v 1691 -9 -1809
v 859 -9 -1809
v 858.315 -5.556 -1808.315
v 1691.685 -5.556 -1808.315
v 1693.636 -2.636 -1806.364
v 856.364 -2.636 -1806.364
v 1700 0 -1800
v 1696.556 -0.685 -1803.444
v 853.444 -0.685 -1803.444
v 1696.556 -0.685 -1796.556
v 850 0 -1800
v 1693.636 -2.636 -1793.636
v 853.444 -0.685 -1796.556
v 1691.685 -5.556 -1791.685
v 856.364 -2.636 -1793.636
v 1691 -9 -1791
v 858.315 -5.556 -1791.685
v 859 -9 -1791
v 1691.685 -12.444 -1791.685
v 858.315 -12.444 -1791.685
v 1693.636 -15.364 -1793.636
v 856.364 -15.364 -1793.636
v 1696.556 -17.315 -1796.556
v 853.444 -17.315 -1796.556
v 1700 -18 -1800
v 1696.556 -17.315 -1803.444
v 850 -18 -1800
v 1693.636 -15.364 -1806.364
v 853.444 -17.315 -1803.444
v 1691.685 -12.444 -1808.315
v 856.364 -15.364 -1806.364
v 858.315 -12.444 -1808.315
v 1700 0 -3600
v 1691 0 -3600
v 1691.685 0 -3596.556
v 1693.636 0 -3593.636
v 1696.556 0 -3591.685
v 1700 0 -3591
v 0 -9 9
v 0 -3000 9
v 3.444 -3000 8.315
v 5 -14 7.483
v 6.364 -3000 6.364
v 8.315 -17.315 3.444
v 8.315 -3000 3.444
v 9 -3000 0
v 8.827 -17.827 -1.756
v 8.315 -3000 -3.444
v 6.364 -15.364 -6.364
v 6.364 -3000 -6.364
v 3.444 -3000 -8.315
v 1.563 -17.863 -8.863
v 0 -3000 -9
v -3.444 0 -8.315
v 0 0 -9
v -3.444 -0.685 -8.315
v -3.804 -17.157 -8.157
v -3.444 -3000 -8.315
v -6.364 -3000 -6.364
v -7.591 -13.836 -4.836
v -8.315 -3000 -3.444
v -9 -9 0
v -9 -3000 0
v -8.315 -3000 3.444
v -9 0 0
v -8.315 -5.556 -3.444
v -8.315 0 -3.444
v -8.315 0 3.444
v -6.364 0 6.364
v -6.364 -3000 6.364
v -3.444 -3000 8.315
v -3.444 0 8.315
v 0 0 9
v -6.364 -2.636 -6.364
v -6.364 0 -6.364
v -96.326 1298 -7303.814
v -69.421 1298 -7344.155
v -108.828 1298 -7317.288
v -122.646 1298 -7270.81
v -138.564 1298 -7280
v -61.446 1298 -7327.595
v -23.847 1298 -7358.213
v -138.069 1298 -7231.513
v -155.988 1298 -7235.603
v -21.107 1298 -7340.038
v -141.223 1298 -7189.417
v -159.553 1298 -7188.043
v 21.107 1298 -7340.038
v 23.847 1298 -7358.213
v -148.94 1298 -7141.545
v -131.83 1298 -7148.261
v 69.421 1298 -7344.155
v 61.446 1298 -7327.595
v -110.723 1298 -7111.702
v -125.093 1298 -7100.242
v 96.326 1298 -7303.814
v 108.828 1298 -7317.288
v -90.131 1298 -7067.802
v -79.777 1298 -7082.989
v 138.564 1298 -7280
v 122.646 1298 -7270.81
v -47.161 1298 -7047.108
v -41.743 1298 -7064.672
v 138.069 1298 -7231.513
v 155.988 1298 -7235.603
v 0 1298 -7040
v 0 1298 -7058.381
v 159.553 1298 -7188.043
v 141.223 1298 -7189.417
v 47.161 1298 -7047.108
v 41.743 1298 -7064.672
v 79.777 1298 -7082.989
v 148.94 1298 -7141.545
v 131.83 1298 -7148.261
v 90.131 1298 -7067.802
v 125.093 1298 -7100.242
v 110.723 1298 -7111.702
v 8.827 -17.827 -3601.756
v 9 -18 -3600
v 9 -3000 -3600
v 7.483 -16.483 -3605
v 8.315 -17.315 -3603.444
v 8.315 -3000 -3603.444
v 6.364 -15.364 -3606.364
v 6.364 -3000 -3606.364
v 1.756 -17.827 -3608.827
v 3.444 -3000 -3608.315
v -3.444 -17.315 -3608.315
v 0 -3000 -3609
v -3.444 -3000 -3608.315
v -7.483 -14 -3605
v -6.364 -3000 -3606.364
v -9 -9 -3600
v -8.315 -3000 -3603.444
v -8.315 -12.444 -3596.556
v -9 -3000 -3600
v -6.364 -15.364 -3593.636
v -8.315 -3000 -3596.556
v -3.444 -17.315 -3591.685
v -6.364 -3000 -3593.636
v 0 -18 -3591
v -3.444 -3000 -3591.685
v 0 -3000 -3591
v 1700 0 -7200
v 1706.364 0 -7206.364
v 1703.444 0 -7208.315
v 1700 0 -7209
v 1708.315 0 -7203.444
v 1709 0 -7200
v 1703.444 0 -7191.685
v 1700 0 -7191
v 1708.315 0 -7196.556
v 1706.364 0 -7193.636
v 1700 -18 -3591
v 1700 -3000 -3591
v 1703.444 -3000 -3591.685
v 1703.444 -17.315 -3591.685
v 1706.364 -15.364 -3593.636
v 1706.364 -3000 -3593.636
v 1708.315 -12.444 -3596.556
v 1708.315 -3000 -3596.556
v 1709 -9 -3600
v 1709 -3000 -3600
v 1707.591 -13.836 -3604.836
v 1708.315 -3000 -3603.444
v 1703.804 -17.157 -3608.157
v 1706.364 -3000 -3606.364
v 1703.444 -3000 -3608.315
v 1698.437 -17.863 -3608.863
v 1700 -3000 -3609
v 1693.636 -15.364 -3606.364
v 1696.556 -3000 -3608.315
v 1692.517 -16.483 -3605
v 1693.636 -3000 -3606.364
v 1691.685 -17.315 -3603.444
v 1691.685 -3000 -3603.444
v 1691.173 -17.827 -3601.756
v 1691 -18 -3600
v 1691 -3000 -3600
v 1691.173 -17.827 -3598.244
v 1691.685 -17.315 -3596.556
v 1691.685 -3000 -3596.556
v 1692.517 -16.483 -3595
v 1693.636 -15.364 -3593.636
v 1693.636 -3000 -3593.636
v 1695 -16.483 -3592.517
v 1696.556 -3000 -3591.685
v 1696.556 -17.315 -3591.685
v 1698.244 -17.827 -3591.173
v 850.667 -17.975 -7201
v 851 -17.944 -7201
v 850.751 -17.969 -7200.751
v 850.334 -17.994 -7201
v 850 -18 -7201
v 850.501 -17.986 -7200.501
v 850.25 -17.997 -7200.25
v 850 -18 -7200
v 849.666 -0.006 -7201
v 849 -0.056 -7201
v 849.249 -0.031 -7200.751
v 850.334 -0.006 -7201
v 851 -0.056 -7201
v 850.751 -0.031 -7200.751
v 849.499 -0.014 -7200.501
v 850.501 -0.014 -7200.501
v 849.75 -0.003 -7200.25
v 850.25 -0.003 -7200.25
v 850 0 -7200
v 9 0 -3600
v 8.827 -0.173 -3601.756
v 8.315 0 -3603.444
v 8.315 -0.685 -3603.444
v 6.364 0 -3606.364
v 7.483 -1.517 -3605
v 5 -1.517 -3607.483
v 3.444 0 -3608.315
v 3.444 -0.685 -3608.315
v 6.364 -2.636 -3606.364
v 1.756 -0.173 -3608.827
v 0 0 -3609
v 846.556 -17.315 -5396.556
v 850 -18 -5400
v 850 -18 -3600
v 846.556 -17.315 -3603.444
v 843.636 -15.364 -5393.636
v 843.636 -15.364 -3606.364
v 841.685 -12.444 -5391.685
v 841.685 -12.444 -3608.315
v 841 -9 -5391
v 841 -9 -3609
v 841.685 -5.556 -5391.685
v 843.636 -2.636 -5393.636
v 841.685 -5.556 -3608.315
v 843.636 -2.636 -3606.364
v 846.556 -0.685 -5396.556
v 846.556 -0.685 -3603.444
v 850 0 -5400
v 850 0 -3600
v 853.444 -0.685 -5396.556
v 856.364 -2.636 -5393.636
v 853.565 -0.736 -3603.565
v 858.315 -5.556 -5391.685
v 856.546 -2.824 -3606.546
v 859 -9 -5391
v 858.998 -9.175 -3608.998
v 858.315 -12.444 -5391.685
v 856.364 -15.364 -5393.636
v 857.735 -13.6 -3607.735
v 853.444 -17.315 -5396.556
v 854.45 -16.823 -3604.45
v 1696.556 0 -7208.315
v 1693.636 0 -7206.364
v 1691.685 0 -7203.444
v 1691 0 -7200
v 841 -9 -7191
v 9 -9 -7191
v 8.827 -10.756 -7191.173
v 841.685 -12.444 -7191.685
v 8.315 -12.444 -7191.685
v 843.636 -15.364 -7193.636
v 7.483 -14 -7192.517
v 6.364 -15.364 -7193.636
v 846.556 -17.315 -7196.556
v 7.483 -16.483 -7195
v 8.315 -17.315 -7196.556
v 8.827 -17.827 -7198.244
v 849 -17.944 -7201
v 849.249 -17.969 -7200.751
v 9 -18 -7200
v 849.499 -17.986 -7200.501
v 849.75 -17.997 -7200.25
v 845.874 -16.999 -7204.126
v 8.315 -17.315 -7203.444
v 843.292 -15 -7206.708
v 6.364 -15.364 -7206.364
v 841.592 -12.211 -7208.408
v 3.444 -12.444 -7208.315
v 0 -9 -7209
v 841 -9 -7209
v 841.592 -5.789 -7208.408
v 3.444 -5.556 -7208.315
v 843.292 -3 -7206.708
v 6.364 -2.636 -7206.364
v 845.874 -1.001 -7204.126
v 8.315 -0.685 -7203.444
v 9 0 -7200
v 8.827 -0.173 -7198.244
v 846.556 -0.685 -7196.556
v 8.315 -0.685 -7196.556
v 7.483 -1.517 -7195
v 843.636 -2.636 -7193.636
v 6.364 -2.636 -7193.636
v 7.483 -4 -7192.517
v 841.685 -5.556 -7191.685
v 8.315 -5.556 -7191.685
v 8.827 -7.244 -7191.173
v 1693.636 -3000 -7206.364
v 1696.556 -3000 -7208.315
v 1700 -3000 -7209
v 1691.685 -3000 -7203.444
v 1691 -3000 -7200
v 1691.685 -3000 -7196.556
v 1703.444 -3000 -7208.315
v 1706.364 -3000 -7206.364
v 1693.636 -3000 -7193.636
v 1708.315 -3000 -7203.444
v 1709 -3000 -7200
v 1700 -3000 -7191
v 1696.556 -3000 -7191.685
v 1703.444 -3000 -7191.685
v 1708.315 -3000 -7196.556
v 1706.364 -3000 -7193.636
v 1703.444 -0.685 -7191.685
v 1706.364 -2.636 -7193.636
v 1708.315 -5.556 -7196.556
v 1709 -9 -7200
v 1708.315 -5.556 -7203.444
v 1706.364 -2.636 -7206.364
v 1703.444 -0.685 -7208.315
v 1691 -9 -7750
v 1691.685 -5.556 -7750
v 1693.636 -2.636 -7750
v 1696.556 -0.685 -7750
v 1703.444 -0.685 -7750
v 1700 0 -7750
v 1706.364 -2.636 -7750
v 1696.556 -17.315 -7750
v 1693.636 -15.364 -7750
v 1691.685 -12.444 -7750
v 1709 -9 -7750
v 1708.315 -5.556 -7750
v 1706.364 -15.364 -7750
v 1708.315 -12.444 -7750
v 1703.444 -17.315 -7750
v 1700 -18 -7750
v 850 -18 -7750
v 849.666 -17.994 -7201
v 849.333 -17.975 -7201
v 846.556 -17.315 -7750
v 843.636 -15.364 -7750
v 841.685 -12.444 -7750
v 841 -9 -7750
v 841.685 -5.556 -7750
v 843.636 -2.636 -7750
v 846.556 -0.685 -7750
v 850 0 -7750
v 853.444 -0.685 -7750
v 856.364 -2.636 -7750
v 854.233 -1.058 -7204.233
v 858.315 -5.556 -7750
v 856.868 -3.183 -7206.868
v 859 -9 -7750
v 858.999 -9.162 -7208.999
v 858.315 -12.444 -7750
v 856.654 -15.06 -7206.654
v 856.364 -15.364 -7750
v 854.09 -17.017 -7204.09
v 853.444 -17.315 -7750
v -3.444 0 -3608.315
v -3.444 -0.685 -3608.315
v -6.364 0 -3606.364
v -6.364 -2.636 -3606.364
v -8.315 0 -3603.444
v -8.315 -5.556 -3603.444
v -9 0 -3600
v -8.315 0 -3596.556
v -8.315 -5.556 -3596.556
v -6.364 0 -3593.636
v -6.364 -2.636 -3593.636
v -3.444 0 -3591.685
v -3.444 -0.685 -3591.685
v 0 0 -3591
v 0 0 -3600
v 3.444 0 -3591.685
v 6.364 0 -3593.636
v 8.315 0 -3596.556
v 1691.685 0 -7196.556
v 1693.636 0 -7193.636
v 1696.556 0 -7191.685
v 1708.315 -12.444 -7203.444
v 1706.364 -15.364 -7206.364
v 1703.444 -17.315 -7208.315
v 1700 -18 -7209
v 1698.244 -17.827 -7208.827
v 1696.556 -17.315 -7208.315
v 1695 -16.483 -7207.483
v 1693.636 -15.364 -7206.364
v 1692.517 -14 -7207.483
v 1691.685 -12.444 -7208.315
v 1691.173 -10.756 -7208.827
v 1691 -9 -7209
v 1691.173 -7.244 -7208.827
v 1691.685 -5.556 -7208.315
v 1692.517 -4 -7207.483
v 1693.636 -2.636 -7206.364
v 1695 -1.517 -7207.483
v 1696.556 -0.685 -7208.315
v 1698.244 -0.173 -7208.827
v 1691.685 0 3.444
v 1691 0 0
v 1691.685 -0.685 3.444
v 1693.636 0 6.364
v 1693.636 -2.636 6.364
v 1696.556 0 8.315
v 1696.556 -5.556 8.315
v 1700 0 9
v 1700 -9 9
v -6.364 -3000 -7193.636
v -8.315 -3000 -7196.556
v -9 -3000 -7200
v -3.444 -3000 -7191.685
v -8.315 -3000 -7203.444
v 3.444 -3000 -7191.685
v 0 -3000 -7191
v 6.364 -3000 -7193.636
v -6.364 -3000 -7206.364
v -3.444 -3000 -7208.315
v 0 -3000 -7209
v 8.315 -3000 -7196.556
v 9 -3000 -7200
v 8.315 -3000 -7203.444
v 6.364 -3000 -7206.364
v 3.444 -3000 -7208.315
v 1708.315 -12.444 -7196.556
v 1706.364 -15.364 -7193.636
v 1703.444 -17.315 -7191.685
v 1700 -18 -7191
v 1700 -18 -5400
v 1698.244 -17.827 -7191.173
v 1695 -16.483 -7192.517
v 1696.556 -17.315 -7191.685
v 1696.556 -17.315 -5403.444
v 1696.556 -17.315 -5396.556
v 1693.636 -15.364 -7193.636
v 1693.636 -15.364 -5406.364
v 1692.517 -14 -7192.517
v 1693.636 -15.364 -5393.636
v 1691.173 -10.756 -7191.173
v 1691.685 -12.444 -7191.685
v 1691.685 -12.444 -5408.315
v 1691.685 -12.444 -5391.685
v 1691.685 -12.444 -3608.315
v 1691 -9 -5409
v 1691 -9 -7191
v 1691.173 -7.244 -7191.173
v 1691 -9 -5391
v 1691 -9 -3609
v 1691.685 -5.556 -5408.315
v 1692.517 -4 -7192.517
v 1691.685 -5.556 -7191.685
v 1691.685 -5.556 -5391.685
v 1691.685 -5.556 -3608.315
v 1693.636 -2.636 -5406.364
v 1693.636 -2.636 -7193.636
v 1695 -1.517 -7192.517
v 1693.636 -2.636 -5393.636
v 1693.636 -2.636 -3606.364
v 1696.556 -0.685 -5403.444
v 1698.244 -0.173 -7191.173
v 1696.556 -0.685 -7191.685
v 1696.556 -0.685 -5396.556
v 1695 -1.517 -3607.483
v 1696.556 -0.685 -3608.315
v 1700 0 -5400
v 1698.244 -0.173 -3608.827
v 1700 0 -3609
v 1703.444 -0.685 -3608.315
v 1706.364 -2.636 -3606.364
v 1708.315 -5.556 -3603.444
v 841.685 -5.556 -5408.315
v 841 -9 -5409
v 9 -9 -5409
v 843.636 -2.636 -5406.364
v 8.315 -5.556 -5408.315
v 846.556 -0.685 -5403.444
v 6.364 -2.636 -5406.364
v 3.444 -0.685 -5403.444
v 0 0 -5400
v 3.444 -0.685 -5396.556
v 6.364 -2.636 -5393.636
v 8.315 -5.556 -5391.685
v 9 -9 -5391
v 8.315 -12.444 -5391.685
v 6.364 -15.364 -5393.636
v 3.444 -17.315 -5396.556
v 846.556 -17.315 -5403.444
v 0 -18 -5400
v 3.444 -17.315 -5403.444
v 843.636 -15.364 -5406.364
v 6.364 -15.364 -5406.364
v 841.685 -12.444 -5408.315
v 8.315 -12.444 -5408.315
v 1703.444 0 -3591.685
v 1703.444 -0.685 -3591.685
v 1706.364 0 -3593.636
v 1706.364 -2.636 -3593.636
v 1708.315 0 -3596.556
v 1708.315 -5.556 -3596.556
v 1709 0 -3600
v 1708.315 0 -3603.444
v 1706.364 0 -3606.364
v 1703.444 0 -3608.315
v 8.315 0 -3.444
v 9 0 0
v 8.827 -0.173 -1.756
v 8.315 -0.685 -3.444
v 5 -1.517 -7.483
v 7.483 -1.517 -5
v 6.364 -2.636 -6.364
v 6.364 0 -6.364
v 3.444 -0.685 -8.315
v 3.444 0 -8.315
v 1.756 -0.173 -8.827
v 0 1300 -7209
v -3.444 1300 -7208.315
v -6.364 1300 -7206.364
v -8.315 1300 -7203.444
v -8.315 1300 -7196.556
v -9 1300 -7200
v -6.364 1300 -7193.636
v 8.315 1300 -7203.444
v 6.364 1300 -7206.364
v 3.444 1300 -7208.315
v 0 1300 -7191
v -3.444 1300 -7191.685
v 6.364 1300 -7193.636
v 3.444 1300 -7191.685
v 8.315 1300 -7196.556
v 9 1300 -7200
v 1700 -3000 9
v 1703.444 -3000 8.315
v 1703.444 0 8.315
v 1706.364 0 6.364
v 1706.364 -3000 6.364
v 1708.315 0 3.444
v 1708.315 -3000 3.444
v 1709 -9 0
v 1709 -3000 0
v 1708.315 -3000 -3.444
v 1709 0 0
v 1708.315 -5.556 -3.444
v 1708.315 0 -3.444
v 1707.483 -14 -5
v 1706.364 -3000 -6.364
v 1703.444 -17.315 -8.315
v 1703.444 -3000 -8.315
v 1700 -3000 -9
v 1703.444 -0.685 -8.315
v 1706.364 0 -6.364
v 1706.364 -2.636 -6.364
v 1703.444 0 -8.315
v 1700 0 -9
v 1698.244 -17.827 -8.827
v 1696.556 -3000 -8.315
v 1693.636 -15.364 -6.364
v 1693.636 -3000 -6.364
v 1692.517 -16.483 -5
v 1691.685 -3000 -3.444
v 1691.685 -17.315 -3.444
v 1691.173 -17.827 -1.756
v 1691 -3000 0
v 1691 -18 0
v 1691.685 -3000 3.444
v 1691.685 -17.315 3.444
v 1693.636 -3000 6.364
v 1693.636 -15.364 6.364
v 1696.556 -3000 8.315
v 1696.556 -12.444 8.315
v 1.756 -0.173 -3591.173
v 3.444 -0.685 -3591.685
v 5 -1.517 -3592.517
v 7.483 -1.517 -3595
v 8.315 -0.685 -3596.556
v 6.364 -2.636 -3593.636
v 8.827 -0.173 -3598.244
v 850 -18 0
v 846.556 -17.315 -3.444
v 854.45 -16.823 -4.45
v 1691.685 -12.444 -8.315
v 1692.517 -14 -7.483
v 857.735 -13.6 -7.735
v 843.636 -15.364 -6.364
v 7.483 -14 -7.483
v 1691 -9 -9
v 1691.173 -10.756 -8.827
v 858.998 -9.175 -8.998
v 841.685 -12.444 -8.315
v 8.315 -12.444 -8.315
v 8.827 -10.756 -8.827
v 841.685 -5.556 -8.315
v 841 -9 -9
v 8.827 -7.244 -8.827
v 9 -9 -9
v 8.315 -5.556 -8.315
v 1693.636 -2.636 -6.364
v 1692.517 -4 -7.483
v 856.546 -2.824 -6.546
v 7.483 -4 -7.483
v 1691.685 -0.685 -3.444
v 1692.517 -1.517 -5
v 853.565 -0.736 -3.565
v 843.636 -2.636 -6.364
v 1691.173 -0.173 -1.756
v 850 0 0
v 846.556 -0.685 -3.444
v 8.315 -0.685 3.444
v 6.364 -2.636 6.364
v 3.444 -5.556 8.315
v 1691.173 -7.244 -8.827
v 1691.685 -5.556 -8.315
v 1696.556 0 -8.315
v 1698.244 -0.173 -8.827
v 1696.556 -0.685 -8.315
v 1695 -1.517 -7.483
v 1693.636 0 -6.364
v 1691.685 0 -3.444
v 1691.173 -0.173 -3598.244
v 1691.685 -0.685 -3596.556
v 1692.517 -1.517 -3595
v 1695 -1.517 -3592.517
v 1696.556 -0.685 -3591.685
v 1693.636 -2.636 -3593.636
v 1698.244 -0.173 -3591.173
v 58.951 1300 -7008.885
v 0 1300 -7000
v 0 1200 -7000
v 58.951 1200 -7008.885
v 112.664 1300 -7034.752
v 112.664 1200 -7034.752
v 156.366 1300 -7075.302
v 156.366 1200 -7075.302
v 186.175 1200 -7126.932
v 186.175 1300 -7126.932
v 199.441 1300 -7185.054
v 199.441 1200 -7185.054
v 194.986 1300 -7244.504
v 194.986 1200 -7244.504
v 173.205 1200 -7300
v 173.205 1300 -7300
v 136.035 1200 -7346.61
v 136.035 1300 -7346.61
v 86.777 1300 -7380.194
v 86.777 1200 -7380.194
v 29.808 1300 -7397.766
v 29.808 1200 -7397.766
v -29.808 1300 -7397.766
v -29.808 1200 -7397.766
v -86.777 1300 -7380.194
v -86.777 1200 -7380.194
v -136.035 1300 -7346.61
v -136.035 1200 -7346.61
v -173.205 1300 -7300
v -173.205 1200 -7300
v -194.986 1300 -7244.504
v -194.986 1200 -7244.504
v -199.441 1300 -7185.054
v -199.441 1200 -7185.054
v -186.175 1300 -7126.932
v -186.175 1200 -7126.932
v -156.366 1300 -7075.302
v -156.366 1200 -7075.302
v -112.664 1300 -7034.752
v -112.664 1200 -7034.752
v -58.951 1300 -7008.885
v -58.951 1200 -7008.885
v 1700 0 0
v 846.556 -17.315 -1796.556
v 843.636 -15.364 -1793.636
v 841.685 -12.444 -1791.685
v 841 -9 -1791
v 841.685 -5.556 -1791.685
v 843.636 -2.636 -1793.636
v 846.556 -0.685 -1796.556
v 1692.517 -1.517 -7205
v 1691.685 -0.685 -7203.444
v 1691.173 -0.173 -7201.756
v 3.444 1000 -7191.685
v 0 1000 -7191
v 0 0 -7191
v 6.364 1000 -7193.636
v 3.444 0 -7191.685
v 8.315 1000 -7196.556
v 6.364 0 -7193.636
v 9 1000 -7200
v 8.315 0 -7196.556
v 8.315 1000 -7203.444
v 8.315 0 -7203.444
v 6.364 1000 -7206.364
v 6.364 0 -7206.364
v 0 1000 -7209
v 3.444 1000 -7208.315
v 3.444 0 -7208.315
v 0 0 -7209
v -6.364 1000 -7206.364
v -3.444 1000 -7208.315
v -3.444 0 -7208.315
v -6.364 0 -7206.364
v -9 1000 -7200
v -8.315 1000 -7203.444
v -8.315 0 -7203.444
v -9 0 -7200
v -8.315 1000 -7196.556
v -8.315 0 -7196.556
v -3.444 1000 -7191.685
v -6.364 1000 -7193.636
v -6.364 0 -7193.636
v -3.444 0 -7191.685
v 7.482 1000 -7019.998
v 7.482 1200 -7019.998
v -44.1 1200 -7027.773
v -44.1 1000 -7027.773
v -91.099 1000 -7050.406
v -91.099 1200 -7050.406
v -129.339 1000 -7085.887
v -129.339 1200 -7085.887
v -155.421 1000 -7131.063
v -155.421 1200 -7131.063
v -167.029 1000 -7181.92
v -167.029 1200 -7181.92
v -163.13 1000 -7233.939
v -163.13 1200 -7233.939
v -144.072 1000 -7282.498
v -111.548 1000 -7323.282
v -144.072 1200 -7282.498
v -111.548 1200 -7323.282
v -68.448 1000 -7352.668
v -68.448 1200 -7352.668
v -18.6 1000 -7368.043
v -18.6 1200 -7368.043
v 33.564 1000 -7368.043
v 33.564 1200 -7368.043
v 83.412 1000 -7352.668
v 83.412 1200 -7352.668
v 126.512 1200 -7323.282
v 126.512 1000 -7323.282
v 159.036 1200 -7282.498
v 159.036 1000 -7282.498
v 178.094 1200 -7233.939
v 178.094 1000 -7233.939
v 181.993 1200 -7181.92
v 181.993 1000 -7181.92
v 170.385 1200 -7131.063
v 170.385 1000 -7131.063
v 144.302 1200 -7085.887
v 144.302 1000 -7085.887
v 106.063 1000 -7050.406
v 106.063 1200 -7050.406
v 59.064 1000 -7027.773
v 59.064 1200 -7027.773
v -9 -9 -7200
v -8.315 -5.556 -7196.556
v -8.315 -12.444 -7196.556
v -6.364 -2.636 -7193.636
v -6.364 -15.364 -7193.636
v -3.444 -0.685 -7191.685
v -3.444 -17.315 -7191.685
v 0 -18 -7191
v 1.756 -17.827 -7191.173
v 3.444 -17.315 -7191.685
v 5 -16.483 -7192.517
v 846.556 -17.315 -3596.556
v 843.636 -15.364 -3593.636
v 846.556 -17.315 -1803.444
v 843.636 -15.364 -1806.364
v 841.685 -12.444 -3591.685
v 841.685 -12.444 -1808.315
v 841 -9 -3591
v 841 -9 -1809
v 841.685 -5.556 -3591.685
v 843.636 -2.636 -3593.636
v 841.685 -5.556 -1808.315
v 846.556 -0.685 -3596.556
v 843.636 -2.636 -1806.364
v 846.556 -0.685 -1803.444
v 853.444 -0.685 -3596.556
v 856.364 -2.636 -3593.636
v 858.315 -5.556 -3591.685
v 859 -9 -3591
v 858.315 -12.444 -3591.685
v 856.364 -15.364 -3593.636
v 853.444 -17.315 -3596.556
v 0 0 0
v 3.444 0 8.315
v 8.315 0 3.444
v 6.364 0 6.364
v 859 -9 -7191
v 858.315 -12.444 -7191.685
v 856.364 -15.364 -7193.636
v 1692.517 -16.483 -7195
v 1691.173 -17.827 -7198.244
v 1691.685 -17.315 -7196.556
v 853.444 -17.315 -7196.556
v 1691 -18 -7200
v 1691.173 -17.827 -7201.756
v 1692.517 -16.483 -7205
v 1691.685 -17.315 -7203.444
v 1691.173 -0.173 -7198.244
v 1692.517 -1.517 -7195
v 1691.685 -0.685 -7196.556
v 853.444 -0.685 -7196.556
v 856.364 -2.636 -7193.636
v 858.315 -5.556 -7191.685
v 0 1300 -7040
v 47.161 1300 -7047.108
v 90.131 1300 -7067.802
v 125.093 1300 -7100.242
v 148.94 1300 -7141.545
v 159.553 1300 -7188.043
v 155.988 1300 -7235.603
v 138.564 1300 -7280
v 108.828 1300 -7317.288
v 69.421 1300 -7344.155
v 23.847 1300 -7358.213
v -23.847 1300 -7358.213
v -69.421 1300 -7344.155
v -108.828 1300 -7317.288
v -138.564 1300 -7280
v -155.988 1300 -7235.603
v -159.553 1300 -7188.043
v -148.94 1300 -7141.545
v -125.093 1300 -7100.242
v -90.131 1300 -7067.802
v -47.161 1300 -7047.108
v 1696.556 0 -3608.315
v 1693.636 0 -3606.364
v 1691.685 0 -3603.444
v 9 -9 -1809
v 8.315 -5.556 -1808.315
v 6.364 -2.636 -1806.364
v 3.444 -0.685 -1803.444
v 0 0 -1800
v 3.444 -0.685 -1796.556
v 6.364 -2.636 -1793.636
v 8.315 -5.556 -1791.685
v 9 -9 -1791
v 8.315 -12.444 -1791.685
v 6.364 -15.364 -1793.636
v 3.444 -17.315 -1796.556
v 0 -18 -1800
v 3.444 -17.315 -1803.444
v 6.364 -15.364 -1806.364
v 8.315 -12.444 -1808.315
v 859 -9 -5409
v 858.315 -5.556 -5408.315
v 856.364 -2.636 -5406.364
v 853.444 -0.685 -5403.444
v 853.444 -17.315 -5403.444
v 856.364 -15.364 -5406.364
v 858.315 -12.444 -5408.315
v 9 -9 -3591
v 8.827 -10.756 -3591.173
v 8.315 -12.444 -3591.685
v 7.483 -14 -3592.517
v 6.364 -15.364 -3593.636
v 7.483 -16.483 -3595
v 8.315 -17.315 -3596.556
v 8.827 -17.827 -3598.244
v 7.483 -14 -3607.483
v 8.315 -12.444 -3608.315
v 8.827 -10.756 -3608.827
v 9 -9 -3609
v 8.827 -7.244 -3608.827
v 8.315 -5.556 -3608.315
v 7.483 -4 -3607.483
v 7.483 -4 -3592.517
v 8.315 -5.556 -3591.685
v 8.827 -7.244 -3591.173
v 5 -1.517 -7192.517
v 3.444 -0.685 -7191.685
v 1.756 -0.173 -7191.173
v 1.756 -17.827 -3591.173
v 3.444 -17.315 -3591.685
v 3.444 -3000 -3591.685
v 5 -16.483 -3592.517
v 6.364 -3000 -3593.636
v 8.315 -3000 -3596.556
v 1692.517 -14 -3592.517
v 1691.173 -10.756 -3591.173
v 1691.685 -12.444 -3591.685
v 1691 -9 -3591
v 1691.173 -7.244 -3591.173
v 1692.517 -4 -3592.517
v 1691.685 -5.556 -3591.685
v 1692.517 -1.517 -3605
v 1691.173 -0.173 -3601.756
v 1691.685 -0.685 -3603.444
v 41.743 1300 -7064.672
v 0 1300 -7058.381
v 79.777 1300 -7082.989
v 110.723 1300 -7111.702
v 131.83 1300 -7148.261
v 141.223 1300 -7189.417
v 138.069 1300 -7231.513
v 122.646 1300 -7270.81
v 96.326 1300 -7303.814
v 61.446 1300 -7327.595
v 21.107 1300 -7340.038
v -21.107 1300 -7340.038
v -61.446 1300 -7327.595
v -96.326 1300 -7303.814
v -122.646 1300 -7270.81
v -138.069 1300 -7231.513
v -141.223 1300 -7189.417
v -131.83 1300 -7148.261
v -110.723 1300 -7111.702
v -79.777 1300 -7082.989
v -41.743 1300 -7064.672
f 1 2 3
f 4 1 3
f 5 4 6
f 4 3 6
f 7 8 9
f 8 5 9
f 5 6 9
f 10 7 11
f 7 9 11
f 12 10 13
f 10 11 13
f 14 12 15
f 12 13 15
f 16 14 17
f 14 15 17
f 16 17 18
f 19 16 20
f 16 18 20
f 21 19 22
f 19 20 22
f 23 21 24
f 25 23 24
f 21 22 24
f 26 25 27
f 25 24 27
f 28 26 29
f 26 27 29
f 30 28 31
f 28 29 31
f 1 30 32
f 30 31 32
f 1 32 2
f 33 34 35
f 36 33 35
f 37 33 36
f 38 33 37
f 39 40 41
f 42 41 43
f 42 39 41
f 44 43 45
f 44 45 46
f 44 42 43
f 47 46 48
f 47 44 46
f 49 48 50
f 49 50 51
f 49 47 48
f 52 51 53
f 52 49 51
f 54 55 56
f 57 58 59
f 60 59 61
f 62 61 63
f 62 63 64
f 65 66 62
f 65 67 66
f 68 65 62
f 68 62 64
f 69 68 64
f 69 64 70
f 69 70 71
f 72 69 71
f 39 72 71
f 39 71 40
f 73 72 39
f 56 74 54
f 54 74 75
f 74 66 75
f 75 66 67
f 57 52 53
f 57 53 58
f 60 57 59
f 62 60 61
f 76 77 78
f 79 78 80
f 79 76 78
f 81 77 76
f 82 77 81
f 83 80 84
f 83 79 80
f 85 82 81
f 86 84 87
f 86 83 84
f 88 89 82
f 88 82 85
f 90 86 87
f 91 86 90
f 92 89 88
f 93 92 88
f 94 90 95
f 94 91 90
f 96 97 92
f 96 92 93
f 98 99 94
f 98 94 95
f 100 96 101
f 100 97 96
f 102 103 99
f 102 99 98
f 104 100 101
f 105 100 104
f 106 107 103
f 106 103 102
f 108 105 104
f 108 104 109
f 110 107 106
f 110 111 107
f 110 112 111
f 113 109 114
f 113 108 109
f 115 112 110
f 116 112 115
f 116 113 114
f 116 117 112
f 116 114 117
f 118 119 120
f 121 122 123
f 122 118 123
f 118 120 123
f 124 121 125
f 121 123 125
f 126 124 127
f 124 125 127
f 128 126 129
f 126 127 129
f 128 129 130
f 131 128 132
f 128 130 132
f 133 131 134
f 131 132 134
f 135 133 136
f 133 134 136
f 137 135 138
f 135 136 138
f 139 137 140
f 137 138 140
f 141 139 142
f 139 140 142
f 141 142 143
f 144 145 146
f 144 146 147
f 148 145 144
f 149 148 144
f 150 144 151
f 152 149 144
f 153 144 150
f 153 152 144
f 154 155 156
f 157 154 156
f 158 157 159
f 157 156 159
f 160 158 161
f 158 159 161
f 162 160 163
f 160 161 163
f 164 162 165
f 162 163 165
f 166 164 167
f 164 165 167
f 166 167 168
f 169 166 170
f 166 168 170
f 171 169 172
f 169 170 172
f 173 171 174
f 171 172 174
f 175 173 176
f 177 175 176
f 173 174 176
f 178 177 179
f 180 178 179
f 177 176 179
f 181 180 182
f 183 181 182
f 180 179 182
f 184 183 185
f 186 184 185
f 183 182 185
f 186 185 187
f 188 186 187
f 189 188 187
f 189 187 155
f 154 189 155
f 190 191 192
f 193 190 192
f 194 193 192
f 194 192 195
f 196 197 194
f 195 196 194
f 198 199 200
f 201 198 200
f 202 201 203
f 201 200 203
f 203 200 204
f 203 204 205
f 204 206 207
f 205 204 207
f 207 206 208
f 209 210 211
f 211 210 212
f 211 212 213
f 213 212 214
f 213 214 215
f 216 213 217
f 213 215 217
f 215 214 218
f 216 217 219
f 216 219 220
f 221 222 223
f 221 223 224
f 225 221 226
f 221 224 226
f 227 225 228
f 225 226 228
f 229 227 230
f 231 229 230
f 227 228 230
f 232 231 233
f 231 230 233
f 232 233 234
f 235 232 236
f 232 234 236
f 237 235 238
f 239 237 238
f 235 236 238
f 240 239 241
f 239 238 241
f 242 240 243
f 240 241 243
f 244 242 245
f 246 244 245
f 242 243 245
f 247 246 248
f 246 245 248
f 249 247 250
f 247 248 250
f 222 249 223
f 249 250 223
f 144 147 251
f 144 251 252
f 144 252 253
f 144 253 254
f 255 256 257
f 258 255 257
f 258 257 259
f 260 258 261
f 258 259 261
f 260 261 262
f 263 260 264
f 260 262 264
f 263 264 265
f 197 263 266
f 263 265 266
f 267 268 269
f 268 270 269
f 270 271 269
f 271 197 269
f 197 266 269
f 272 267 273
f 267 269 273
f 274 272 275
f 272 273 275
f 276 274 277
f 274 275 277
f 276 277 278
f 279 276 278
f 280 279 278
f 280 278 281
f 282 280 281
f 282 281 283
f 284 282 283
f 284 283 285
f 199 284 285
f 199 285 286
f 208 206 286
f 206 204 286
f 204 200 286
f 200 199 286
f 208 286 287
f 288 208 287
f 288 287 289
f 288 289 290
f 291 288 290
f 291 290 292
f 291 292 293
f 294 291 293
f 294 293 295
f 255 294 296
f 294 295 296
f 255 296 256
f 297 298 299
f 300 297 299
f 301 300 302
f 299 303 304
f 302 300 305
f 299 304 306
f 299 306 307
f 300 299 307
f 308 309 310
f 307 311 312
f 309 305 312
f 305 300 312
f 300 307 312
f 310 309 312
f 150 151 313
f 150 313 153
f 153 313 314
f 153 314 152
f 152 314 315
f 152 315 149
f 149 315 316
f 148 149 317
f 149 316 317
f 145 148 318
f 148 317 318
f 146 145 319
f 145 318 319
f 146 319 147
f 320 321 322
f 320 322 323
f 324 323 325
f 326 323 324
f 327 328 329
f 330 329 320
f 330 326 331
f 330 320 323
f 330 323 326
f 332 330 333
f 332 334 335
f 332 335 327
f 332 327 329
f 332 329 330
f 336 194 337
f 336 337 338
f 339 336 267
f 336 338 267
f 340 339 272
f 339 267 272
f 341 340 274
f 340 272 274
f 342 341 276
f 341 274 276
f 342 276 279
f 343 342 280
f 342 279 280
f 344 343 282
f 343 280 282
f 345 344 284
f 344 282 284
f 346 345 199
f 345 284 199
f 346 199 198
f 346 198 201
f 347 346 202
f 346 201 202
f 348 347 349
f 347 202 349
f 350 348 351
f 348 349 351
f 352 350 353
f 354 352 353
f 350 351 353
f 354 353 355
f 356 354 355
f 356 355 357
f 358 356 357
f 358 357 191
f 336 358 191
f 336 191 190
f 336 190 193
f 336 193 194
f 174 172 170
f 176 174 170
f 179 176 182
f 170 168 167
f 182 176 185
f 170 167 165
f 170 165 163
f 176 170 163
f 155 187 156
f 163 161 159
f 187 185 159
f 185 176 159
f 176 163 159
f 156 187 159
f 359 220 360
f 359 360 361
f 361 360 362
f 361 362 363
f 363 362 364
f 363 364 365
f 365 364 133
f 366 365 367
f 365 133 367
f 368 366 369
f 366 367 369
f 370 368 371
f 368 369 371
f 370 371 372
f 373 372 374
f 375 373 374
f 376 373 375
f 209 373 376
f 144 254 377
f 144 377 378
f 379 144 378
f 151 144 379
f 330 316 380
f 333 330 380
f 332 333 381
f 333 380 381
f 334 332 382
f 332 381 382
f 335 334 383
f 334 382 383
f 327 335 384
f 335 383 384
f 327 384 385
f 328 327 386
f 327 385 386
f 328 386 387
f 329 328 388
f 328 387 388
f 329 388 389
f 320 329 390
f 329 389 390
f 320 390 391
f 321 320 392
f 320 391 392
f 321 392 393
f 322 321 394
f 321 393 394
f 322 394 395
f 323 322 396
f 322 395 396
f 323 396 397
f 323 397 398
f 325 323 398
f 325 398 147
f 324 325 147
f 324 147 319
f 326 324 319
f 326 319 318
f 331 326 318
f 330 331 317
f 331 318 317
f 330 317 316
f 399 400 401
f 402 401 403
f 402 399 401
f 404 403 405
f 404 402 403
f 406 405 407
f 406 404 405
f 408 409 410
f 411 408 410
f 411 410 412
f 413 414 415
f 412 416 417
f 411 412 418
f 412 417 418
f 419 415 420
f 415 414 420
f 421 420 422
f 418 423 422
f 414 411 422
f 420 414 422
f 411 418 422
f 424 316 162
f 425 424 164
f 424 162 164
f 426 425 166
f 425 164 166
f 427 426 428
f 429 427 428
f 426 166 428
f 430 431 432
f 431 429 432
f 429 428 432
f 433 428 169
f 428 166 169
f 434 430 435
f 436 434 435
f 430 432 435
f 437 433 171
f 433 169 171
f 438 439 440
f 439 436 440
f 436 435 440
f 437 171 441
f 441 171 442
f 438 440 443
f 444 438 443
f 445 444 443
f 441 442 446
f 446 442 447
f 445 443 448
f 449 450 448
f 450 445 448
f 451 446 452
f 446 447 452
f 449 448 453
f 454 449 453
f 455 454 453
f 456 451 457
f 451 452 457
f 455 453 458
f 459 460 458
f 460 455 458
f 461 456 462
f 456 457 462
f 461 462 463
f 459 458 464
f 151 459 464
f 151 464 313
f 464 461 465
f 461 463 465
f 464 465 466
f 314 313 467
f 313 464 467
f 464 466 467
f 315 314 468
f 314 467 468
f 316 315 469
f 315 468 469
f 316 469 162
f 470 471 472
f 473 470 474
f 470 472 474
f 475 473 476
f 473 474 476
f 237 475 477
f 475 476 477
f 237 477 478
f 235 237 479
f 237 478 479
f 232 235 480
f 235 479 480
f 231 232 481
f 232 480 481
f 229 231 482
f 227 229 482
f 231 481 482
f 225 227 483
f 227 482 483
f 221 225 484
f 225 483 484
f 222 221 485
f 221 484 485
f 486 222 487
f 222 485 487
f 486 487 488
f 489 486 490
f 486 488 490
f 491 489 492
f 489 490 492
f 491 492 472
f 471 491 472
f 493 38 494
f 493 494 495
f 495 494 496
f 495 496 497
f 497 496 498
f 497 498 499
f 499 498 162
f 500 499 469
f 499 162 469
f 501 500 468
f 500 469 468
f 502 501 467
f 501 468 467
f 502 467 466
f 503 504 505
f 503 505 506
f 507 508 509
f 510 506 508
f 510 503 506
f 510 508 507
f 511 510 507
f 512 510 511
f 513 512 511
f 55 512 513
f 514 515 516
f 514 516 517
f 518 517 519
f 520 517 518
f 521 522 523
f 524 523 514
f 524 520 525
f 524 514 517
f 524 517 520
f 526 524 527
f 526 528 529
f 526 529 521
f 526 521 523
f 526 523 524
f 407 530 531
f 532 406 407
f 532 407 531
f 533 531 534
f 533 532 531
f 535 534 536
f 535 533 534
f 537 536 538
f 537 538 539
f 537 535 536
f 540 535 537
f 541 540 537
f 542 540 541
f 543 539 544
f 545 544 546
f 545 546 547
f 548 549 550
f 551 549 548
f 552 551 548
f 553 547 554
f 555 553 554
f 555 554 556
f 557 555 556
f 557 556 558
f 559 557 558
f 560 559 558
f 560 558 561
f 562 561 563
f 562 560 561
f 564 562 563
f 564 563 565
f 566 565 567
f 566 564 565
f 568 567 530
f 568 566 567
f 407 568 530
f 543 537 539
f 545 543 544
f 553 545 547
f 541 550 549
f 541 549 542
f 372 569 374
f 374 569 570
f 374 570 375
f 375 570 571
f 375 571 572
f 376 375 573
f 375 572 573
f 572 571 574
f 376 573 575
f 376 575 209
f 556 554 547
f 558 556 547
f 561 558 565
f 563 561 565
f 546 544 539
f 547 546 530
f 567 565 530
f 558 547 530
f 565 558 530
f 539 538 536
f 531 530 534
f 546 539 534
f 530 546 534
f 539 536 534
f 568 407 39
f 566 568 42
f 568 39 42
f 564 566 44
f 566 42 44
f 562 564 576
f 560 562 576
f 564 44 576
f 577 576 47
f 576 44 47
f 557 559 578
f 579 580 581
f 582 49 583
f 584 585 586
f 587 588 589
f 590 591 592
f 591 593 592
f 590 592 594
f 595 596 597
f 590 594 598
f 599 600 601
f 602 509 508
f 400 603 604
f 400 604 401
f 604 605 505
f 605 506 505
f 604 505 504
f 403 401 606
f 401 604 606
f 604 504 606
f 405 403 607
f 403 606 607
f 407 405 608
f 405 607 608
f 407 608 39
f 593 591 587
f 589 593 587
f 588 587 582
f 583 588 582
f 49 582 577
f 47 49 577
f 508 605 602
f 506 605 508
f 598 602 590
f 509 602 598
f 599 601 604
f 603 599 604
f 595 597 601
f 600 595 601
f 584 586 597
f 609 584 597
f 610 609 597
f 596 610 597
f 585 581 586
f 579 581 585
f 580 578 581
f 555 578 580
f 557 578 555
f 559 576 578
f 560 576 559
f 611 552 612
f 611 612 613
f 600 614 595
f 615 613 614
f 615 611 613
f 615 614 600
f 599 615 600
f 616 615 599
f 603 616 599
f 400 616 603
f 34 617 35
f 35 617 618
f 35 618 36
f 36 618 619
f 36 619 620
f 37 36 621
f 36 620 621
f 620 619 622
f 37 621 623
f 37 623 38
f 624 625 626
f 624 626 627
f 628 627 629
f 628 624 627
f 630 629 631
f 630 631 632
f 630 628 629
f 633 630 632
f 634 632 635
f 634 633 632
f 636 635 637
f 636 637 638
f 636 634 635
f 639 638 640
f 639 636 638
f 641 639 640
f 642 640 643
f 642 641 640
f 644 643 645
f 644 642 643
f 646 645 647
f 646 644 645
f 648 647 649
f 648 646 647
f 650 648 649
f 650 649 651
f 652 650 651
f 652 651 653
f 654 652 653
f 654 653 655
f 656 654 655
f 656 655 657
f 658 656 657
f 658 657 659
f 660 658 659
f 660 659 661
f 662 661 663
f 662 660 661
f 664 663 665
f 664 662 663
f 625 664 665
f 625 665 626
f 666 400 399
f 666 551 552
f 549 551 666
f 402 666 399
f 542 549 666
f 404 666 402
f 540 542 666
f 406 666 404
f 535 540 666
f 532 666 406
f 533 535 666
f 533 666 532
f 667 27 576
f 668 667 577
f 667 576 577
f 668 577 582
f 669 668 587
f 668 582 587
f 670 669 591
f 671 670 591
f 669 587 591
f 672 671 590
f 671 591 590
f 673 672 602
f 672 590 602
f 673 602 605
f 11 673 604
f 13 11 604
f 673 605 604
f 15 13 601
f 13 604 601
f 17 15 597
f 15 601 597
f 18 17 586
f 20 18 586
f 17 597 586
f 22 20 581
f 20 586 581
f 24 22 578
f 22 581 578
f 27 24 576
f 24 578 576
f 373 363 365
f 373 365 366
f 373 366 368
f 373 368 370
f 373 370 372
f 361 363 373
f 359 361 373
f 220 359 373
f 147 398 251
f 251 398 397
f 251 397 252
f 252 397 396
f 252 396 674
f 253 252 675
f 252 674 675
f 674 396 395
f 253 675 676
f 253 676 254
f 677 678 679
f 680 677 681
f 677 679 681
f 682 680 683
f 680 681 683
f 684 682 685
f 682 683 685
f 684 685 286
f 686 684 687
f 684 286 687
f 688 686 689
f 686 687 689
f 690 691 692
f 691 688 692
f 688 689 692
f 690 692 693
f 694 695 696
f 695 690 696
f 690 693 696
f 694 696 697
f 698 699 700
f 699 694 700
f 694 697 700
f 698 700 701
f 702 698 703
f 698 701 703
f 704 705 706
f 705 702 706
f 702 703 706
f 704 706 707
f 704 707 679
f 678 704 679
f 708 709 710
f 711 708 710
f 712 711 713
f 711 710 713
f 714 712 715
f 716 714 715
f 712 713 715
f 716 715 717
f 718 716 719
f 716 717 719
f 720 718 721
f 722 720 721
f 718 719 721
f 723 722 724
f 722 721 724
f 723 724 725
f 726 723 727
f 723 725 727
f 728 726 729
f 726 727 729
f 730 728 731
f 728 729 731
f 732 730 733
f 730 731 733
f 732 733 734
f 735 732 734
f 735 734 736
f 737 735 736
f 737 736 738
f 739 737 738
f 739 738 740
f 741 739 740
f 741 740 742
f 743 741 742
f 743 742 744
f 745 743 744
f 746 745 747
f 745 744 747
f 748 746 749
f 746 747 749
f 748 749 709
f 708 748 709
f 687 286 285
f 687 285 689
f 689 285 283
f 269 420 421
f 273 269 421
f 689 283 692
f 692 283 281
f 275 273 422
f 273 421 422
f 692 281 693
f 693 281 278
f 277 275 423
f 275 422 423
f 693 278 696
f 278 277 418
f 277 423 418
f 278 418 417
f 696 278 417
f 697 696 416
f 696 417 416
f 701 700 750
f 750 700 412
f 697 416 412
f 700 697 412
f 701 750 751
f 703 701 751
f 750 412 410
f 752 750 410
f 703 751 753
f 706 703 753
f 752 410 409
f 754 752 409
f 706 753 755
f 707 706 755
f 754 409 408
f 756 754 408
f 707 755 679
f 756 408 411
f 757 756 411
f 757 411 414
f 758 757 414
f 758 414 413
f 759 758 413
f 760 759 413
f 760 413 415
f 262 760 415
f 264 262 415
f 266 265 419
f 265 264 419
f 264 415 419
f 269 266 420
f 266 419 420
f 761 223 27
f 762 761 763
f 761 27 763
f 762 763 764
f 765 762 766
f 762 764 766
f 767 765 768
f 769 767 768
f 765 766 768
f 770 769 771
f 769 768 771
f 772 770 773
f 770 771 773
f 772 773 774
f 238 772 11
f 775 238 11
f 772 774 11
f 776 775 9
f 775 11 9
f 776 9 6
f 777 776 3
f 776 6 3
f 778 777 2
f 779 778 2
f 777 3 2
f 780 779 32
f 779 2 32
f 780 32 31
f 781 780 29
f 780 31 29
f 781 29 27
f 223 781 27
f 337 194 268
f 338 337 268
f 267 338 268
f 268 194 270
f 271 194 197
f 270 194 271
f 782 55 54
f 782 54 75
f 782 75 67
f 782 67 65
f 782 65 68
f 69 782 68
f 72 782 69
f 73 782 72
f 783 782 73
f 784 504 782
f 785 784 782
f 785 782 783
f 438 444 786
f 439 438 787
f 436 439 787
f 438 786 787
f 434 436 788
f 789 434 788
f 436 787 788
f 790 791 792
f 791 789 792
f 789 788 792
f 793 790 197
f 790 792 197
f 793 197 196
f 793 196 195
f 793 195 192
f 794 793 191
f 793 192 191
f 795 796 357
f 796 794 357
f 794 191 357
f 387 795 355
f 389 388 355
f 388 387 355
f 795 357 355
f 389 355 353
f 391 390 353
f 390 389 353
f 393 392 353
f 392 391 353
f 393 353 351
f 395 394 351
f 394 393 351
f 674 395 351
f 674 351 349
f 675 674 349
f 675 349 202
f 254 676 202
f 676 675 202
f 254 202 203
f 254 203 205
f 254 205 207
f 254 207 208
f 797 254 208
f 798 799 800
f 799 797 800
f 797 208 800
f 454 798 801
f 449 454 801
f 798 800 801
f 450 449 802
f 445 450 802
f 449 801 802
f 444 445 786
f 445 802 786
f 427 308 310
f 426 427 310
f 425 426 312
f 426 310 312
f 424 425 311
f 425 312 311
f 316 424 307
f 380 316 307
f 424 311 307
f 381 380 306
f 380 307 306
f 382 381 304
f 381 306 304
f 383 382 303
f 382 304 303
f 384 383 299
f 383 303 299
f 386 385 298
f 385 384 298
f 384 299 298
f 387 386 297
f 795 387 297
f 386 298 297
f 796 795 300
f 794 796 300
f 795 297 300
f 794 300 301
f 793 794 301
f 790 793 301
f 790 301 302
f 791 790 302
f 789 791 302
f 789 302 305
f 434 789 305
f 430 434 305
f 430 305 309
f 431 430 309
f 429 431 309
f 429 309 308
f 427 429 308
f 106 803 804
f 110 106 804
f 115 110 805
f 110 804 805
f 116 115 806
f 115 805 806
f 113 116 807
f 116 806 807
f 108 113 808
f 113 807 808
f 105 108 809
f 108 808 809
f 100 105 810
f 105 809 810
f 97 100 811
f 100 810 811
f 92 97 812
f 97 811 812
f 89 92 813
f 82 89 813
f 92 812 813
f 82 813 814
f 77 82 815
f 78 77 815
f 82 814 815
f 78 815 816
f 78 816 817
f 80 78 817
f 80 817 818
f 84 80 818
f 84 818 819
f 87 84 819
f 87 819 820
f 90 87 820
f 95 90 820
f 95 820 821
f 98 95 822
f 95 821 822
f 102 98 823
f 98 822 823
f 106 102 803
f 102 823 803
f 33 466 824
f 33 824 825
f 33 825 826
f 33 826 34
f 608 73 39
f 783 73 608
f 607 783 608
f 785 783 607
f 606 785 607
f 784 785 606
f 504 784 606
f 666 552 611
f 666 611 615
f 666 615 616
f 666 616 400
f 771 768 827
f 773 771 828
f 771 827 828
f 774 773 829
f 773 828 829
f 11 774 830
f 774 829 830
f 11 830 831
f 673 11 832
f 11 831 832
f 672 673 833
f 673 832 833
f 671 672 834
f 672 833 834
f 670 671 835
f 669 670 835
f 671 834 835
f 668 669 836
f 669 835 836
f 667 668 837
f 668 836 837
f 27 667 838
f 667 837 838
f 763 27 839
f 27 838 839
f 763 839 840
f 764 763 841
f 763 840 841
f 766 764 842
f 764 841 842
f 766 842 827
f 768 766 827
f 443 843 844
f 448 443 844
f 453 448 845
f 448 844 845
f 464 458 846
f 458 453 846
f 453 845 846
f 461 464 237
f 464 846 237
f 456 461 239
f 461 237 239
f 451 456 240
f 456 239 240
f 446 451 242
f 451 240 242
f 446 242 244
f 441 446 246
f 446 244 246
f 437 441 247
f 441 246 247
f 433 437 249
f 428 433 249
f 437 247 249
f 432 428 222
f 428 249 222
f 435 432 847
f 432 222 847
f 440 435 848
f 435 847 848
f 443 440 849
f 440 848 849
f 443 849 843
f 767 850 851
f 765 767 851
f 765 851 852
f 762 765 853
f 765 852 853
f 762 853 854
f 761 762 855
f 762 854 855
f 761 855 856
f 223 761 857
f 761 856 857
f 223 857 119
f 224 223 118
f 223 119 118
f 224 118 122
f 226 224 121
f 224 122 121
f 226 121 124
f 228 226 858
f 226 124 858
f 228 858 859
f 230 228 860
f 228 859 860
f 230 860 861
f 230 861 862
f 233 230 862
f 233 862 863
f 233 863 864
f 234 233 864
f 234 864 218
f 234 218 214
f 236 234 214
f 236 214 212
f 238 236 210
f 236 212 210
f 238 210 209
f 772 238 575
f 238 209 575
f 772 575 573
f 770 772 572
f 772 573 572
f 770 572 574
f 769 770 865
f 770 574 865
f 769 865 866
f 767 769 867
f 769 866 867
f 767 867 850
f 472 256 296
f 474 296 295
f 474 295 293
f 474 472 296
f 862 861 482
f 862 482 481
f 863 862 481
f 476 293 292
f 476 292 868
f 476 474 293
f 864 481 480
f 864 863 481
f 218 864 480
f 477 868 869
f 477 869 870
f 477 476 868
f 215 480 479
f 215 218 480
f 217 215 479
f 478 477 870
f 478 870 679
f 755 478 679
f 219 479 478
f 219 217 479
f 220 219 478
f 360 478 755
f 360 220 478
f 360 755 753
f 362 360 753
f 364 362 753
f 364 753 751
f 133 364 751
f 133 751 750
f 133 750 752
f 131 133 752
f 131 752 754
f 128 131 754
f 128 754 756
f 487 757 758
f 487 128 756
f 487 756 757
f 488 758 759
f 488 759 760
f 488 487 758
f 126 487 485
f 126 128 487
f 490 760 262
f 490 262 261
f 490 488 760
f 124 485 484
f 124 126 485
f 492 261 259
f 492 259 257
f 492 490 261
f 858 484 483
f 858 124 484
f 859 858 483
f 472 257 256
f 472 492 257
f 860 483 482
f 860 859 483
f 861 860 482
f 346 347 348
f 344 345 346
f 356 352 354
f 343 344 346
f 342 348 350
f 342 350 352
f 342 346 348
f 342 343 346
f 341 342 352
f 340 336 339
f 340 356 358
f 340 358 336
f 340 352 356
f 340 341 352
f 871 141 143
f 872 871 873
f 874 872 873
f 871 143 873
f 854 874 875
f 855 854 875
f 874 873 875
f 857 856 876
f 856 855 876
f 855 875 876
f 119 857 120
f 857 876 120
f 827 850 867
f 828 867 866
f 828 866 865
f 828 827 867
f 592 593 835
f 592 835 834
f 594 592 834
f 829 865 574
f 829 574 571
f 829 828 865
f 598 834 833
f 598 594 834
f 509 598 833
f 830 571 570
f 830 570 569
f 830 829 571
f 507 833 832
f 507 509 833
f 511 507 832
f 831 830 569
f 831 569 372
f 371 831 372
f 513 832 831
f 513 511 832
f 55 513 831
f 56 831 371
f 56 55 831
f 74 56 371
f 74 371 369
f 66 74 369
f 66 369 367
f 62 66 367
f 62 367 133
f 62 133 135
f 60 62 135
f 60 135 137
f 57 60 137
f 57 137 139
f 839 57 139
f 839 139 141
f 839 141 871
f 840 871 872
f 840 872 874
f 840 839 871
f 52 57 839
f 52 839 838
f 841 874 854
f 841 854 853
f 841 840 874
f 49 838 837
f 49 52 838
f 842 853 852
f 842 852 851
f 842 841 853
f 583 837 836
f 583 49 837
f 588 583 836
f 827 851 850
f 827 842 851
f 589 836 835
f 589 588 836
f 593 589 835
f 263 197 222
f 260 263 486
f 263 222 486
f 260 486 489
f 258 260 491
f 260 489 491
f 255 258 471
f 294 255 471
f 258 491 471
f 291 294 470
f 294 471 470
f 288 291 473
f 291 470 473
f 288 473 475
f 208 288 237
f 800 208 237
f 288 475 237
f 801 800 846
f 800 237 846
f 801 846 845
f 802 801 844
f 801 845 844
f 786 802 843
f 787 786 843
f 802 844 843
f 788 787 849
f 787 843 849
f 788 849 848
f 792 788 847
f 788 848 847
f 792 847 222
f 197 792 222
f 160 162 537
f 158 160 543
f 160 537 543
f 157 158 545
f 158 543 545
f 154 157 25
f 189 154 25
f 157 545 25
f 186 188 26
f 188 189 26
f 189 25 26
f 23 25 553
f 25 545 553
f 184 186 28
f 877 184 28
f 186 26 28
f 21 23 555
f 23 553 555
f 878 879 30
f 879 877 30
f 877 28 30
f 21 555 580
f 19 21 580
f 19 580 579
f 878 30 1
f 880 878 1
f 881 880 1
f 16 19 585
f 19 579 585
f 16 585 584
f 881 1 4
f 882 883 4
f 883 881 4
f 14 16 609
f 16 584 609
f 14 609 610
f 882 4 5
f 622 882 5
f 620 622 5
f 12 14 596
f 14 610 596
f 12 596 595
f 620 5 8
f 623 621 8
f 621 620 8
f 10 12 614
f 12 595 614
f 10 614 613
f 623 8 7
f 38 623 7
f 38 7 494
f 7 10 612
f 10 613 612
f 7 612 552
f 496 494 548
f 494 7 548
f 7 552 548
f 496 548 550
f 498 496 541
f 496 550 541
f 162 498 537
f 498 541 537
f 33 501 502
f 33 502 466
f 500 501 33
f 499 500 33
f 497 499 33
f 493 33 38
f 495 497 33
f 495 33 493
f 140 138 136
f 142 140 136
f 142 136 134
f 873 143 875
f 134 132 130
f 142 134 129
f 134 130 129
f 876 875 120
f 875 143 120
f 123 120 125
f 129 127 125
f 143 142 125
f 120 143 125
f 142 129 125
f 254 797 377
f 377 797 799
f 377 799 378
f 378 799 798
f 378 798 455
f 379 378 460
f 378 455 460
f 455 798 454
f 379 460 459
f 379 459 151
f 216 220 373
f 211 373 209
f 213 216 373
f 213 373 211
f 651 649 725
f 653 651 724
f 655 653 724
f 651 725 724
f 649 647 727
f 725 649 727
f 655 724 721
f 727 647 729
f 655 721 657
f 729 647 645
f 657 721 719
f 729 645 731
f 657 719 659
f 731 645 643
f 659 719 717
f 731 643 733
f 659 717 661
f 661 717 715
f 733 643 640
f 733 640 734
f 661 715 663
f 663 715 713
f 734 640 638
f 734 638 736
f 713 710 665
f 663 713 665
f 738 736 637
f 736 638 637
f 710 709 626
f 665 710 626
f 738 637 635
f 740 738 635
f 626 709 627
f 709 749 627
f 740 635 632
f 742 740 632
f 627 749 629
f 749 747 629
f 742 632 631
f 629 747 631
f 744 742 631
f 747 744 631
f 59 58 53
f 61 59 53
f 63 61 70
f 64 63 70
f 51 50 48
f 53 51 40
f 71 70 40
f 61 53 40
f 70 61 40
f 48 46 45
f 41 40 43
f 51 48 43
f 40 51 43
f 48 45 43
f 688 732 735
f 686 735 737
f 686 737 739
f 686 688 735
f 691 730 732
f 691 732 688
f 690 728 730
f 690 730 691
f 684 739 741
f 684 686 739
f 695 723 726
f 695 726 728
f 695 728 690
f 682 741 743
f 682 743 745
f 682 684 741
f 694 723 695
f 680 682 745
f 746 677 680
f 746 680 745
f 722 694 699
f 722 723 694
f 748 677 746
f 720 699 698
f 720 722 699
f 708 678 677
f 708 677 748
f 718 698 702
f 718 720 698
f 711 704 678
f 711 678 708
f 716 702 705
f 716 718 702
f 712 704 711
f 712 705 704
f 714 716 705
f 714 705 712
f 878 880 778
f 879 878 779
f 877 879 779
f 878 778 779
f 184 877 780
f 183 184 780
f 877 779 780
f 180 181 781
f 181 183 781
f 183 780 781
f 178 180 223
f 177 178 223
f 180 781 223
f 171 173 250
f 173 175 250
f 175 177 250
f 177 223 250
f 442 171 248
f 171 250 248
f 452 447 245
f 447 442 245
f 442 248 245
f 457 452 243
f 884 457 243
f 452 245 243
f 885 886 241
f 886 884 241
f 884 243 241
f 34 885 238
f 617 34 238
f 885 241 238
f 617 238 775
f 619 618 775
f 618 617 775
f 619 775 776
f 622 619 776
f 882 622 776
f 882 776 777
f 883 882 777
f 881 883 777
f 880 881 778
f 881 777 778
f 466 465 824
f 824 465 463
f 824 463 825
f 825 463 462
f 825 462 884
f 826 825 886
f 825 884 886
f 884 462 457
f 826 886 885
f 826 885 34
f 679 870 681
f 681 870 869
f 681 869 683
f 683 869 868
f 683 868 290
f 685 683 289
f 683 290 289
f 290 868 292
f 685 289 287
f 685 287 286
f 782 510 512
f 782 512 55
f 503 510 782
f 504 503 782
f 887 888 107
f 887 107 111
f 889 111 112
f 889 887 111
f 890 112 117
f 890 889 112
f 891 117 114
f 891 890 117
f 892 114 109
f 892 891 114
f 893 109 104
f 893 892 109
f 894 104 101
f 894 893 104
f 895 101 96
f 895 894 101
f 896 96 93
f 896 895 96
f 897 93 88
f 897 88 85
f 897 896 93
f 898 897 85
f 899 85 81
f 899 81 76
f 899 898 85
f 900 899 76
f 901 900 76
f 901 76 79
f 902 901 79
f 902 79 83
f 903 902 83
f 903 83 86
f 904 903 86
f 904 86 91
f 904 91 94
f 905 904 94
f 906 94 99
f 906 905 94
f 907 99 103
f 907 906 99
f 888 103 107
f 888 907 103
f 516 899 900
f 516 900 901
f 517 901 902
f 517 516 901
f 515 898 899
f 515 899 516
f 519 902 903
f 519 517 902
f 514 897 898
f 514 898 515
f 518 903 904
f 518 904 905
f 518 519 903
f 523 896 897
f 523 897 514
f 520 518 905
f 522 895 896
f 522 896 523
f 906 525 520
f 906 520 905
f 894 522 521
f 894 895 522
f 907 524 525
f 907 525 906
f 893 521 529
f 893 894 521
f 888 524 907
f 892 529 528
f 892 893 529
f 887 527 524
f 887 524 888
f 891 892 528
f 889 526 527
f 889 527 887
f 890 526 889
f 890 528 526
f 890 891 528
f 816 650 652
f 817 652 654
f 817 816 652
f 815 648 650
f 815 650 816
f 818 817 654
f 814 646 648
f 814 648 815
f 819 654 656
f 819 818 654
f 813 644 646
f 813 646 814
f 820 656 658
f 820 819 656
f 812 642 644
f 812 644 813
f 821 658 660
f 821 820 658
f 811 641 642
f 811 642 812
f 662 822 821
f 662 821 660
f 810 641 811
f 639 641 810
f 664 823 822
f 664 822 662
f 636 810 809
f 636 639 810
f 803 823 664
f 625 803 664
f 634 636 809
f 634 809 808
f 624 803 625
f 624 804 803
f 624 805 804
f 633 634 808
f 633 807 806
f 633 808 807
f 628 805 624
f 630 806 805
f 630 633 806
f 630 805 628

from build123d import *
from build123d.topology import SkipClean

# Parameters (mm, degrees)
CROQUIS1_R               = 9
SALIENTE_EXTRUIR1_DEPTH  = 3000
CROQUIS2_R               = 9
SALIENTE_EXTRUIR2_DEPTH  = 7200
MATRIZL2_COUNT           = 3
MATRIZL2_PITCH           = 3600
CROQUIS3_R               = 9
SALIENTE_EXTRUIR3_DEPTH  = 1700
MATRIZL3_COUNT           = 2
MATRIZL3_PITCH           = 1700
SALIENTE_EXTRUIR5_START  = 1300
CROQUIS6_R               = 9
SALIENTE_EXTRUIR5_DEPTH  = 1300
CROQUIS7_R               = 200
SALIENTE_EXTRUIR6_DEPTH  = 100
CROQUIS8_R               = 175
SALIENTE_EXTRUIR7_DEPTH  = 200
CROQUIS12_R              = 9
SALIENTE_EXTRUIR8_DEPTH  = 7200
MATRIZL4_COUNT           = 3
MATRIZL4_PITCH           = 3600
CROQUIS13_R              = 9
SALIENTE_EXTRUIR10_DEPTH = 3000
CROQUIS15_R              = 9
SALIENTE_EXTRUIR11_DEPTH = 550
CROQUIS17_R              = 9
SALIENTE_EXTRUIR12_DEPTH = 7201
CROQUIS18_R              = 9
SALIENTE_EXTRUIR14_DEPTH = 1700
CROQUIS19_R              = 160
CROQUIS19_R_2            = 141.619429307
CORTAR_EXTRUIR1_DEPTH    = 2
CROQUIS20_R              = 9
SALIENTE_EXTRUIR15_DEPTH = 550


with BuildPart() as part:
    # Croquis1 → Saliente-Extruir1 (new body)
    with BuildSketch(Plane(origin=(0, 0, 0), x_dir=(1, 0, 0), z_dir=(0, 1, 0))):
        Circle(CROQUIS1_R)
    saliente_extruir1 = extrude(amount=-SALIENTE_EXTRUIR1_DEPTH)

    # Croquis2 → Saliente-Extruir2 (add)
    with BuildSketch(Plane.XY):
        with Locations((0, -9)):
            Circle(CROQUIS2_R)
    extrude(amount=-SALIENTE_EXTRUIR2_DEPTH)

    # MatrizL2: Saliente-Extruir1 ×3
    with Locations(*[(0, 0, -i * MATRIZL2_PITCH) for i in range(1, MATRIZL2_COUNT)]):
        add(saliente_extruir1)

    # Croquis3 → Saliente-Extruir3 (add)
    with BuildSketch(Plane(origin=(0, 0, 0), x_dir=(0, 0, -1), z_dir=(1, 0, 0))):
        with Locations((0, -9)):
            Circle(CROQUIS3_R)
    saliente_extruir3 = extrude(amount=SALIENTE_EXTRUIR3_DEPTH)

    # MatrizL3: Saliente-Extruir1 ×2
    with Locations(*[(i * MATRIZL3_PITCH, 0, 0) for i in range(1, MATRIZL3_COUNT)]):
        add(saliente_extruir1)

    # Croquis6 → Saliente-Extruir5 (add)
    with BuildSketch(Plane(origin=(0, 0, 0), x_dir=(1, 0, 0), z_dir=(0, 1, 0)).offset(SALIENTE_EXTRUIR5_START)):
        with Locations((0, 7200)):
            Circle(CROQUIS6_R)
    extrude(amount=-SALIENTE_EXTRUIR5_DEPTH)

    # Croquis7 → Saliente-Extruir6 (add)
    with BuildSketch(Plane(origin=(0, 1300, 0), x_dir=(1, 0, 0), z_dir=(0, 1, 0))):
        with Locations((0, 7200)):
            Circle(CROQUIS7_R)
    extrude(amount=-SALIENTE_EXTRUIR6_DEPTH)

    # Croquis8 → Saliente-Extruir7 (add)
    with BuildSketch(Plane.XZ.offset(-1200)):
        with Locations((7.481952141, -7194.997961199)):
            Circle(CROQUIS8_R)
    extrude(amount=SALIENTE_EXTRUIR7_DEPTH)

    # Croquis12 → Saliente-Extruir8 (add)
    with SkipClean():  # the faces are left unmerged after this step: merging them gives an invalid solid
        with BuildSketch(Plane(origin=(0, 0, 0), x_dir=(-1, 0, 0), z_dir=(0, 0, -1))):
            with Locations((-1700, -9)):
                Circle(CROQUIS12_R)
        extrude(amount=SALIENTE_EXTRUIR8_DEPTH)

    # MatrizL4: Saliente-Extruir3 ×3
    with SkipClean():  # the faces are left unmerged after this step: merging them gives an invalid solid
        with Locations(*[(0, 0, -i * MATRIZL4_PITCH) for i in range(1, MATRIZL4_COUNT)]):
            add(saliente_extruir3)

    # Croquis13 → Saliente-Extruir10 (add)
    with SkipClean():  # the faces are left unmerged after this step: merging them gives an invalid solid
        with BuildSketch(Plane(origin=(0, 0, 0), x_dir=(1, 0, 0), z_dir=(0, 1, 0))):
            with Locations((0, 3600)):
                Circle(CROQUIS13_R)
            with Locations((1700, 3600)):
                Circle(CROQUIS13_R)
            with Locations((1700, 7200)):
                Circle(CROQUIS13_R)
        extrude(amount=-SALIENTE_EXTRUIR10_DEPTH)

    # Croquis15 → Saliente-Extruir11 (add)
    with SkipClean():  # the faces are left unmerged after this step: merging them gives an invalid solid
        with BuildSketch(Plane(origin=(0, 0, -7200), x_dir=(-1, 0, 0), z_dir=(0, 0, -1))):
            with Locations((-1700, -9)):
                Circle(CROQUIS15_R)
        extrude(amount=SALIENTE_EXTRUIR11_DEPTH)

    # Croquis17 → Saliente-Extruir12 (add)
    with SkipClean():  # the faces are left unmerged after this step: merging them gives an invalid solid
        with BuildSketch(Plane(origin=(0, 0, 0), x_dir=(-1, 0, 0), z_dir=(0, 0, -1))):
            with Locations((-850, -9)):
                Circle(CROQUIS17_R)
        extrude(amount=SALIENTE_EXTRUIR12_DEPTH)

    # Croquis18 → Saliente-Extruir14 (add)
    with SkipClean():  # the faces are left unmerged after this step: merging them gives an invalid solid
        with BuildSketch(Plane(origin=(0, 0, 0), x_dir=(0, 0, -1), z_dir=(1, 0, 0))):
            with Locations((1800, -9)):
                Circle(CROQUIS18_R)
            with Locations((5400, -9)):
                Circle(CROQUIS18_R)
        extrude(amount=SALIENTE_EXTRUIR14_DEPTH)

    # Croquis19 → Cortar-Extruir1 (cut)
    with SkipClean():  # the faces are left unmerged after this step: merging them gives an invalid solid
        with BuildSketch(Plane(origin=(0, 1300, 0), x_dir=(1, 0, 0), z_dir=(0, 1, 0))):
            with Locations((0, 7200)):
                Circle(CROQUIS19_R)
            with Locations((0, 7200)):
                Circle(CROQUIS19_R_2, mode=Mode.SUBTRACT)
        extrude(amount=-CORTAR_EXTRUIR1_DEPTH, mode=Mode.SUBTRACT)

    # Croquis20 → Saliente-Extruir15 (add)
    with SkipClean():  # the faces are left unmerged after this step: merging them gives an invalid solid
        with BuildSketch(Plane(origin=(0, 0, -7200), x_dir=(-1, 0, 0), z_dir=(0, 0, -1))):
            with Locations((-850, -9)):
                Circle(CROQUIS20_R)
        extrude(amount=SALIENTE_EXTRUIR15_DEPTH)


solid = part.part
